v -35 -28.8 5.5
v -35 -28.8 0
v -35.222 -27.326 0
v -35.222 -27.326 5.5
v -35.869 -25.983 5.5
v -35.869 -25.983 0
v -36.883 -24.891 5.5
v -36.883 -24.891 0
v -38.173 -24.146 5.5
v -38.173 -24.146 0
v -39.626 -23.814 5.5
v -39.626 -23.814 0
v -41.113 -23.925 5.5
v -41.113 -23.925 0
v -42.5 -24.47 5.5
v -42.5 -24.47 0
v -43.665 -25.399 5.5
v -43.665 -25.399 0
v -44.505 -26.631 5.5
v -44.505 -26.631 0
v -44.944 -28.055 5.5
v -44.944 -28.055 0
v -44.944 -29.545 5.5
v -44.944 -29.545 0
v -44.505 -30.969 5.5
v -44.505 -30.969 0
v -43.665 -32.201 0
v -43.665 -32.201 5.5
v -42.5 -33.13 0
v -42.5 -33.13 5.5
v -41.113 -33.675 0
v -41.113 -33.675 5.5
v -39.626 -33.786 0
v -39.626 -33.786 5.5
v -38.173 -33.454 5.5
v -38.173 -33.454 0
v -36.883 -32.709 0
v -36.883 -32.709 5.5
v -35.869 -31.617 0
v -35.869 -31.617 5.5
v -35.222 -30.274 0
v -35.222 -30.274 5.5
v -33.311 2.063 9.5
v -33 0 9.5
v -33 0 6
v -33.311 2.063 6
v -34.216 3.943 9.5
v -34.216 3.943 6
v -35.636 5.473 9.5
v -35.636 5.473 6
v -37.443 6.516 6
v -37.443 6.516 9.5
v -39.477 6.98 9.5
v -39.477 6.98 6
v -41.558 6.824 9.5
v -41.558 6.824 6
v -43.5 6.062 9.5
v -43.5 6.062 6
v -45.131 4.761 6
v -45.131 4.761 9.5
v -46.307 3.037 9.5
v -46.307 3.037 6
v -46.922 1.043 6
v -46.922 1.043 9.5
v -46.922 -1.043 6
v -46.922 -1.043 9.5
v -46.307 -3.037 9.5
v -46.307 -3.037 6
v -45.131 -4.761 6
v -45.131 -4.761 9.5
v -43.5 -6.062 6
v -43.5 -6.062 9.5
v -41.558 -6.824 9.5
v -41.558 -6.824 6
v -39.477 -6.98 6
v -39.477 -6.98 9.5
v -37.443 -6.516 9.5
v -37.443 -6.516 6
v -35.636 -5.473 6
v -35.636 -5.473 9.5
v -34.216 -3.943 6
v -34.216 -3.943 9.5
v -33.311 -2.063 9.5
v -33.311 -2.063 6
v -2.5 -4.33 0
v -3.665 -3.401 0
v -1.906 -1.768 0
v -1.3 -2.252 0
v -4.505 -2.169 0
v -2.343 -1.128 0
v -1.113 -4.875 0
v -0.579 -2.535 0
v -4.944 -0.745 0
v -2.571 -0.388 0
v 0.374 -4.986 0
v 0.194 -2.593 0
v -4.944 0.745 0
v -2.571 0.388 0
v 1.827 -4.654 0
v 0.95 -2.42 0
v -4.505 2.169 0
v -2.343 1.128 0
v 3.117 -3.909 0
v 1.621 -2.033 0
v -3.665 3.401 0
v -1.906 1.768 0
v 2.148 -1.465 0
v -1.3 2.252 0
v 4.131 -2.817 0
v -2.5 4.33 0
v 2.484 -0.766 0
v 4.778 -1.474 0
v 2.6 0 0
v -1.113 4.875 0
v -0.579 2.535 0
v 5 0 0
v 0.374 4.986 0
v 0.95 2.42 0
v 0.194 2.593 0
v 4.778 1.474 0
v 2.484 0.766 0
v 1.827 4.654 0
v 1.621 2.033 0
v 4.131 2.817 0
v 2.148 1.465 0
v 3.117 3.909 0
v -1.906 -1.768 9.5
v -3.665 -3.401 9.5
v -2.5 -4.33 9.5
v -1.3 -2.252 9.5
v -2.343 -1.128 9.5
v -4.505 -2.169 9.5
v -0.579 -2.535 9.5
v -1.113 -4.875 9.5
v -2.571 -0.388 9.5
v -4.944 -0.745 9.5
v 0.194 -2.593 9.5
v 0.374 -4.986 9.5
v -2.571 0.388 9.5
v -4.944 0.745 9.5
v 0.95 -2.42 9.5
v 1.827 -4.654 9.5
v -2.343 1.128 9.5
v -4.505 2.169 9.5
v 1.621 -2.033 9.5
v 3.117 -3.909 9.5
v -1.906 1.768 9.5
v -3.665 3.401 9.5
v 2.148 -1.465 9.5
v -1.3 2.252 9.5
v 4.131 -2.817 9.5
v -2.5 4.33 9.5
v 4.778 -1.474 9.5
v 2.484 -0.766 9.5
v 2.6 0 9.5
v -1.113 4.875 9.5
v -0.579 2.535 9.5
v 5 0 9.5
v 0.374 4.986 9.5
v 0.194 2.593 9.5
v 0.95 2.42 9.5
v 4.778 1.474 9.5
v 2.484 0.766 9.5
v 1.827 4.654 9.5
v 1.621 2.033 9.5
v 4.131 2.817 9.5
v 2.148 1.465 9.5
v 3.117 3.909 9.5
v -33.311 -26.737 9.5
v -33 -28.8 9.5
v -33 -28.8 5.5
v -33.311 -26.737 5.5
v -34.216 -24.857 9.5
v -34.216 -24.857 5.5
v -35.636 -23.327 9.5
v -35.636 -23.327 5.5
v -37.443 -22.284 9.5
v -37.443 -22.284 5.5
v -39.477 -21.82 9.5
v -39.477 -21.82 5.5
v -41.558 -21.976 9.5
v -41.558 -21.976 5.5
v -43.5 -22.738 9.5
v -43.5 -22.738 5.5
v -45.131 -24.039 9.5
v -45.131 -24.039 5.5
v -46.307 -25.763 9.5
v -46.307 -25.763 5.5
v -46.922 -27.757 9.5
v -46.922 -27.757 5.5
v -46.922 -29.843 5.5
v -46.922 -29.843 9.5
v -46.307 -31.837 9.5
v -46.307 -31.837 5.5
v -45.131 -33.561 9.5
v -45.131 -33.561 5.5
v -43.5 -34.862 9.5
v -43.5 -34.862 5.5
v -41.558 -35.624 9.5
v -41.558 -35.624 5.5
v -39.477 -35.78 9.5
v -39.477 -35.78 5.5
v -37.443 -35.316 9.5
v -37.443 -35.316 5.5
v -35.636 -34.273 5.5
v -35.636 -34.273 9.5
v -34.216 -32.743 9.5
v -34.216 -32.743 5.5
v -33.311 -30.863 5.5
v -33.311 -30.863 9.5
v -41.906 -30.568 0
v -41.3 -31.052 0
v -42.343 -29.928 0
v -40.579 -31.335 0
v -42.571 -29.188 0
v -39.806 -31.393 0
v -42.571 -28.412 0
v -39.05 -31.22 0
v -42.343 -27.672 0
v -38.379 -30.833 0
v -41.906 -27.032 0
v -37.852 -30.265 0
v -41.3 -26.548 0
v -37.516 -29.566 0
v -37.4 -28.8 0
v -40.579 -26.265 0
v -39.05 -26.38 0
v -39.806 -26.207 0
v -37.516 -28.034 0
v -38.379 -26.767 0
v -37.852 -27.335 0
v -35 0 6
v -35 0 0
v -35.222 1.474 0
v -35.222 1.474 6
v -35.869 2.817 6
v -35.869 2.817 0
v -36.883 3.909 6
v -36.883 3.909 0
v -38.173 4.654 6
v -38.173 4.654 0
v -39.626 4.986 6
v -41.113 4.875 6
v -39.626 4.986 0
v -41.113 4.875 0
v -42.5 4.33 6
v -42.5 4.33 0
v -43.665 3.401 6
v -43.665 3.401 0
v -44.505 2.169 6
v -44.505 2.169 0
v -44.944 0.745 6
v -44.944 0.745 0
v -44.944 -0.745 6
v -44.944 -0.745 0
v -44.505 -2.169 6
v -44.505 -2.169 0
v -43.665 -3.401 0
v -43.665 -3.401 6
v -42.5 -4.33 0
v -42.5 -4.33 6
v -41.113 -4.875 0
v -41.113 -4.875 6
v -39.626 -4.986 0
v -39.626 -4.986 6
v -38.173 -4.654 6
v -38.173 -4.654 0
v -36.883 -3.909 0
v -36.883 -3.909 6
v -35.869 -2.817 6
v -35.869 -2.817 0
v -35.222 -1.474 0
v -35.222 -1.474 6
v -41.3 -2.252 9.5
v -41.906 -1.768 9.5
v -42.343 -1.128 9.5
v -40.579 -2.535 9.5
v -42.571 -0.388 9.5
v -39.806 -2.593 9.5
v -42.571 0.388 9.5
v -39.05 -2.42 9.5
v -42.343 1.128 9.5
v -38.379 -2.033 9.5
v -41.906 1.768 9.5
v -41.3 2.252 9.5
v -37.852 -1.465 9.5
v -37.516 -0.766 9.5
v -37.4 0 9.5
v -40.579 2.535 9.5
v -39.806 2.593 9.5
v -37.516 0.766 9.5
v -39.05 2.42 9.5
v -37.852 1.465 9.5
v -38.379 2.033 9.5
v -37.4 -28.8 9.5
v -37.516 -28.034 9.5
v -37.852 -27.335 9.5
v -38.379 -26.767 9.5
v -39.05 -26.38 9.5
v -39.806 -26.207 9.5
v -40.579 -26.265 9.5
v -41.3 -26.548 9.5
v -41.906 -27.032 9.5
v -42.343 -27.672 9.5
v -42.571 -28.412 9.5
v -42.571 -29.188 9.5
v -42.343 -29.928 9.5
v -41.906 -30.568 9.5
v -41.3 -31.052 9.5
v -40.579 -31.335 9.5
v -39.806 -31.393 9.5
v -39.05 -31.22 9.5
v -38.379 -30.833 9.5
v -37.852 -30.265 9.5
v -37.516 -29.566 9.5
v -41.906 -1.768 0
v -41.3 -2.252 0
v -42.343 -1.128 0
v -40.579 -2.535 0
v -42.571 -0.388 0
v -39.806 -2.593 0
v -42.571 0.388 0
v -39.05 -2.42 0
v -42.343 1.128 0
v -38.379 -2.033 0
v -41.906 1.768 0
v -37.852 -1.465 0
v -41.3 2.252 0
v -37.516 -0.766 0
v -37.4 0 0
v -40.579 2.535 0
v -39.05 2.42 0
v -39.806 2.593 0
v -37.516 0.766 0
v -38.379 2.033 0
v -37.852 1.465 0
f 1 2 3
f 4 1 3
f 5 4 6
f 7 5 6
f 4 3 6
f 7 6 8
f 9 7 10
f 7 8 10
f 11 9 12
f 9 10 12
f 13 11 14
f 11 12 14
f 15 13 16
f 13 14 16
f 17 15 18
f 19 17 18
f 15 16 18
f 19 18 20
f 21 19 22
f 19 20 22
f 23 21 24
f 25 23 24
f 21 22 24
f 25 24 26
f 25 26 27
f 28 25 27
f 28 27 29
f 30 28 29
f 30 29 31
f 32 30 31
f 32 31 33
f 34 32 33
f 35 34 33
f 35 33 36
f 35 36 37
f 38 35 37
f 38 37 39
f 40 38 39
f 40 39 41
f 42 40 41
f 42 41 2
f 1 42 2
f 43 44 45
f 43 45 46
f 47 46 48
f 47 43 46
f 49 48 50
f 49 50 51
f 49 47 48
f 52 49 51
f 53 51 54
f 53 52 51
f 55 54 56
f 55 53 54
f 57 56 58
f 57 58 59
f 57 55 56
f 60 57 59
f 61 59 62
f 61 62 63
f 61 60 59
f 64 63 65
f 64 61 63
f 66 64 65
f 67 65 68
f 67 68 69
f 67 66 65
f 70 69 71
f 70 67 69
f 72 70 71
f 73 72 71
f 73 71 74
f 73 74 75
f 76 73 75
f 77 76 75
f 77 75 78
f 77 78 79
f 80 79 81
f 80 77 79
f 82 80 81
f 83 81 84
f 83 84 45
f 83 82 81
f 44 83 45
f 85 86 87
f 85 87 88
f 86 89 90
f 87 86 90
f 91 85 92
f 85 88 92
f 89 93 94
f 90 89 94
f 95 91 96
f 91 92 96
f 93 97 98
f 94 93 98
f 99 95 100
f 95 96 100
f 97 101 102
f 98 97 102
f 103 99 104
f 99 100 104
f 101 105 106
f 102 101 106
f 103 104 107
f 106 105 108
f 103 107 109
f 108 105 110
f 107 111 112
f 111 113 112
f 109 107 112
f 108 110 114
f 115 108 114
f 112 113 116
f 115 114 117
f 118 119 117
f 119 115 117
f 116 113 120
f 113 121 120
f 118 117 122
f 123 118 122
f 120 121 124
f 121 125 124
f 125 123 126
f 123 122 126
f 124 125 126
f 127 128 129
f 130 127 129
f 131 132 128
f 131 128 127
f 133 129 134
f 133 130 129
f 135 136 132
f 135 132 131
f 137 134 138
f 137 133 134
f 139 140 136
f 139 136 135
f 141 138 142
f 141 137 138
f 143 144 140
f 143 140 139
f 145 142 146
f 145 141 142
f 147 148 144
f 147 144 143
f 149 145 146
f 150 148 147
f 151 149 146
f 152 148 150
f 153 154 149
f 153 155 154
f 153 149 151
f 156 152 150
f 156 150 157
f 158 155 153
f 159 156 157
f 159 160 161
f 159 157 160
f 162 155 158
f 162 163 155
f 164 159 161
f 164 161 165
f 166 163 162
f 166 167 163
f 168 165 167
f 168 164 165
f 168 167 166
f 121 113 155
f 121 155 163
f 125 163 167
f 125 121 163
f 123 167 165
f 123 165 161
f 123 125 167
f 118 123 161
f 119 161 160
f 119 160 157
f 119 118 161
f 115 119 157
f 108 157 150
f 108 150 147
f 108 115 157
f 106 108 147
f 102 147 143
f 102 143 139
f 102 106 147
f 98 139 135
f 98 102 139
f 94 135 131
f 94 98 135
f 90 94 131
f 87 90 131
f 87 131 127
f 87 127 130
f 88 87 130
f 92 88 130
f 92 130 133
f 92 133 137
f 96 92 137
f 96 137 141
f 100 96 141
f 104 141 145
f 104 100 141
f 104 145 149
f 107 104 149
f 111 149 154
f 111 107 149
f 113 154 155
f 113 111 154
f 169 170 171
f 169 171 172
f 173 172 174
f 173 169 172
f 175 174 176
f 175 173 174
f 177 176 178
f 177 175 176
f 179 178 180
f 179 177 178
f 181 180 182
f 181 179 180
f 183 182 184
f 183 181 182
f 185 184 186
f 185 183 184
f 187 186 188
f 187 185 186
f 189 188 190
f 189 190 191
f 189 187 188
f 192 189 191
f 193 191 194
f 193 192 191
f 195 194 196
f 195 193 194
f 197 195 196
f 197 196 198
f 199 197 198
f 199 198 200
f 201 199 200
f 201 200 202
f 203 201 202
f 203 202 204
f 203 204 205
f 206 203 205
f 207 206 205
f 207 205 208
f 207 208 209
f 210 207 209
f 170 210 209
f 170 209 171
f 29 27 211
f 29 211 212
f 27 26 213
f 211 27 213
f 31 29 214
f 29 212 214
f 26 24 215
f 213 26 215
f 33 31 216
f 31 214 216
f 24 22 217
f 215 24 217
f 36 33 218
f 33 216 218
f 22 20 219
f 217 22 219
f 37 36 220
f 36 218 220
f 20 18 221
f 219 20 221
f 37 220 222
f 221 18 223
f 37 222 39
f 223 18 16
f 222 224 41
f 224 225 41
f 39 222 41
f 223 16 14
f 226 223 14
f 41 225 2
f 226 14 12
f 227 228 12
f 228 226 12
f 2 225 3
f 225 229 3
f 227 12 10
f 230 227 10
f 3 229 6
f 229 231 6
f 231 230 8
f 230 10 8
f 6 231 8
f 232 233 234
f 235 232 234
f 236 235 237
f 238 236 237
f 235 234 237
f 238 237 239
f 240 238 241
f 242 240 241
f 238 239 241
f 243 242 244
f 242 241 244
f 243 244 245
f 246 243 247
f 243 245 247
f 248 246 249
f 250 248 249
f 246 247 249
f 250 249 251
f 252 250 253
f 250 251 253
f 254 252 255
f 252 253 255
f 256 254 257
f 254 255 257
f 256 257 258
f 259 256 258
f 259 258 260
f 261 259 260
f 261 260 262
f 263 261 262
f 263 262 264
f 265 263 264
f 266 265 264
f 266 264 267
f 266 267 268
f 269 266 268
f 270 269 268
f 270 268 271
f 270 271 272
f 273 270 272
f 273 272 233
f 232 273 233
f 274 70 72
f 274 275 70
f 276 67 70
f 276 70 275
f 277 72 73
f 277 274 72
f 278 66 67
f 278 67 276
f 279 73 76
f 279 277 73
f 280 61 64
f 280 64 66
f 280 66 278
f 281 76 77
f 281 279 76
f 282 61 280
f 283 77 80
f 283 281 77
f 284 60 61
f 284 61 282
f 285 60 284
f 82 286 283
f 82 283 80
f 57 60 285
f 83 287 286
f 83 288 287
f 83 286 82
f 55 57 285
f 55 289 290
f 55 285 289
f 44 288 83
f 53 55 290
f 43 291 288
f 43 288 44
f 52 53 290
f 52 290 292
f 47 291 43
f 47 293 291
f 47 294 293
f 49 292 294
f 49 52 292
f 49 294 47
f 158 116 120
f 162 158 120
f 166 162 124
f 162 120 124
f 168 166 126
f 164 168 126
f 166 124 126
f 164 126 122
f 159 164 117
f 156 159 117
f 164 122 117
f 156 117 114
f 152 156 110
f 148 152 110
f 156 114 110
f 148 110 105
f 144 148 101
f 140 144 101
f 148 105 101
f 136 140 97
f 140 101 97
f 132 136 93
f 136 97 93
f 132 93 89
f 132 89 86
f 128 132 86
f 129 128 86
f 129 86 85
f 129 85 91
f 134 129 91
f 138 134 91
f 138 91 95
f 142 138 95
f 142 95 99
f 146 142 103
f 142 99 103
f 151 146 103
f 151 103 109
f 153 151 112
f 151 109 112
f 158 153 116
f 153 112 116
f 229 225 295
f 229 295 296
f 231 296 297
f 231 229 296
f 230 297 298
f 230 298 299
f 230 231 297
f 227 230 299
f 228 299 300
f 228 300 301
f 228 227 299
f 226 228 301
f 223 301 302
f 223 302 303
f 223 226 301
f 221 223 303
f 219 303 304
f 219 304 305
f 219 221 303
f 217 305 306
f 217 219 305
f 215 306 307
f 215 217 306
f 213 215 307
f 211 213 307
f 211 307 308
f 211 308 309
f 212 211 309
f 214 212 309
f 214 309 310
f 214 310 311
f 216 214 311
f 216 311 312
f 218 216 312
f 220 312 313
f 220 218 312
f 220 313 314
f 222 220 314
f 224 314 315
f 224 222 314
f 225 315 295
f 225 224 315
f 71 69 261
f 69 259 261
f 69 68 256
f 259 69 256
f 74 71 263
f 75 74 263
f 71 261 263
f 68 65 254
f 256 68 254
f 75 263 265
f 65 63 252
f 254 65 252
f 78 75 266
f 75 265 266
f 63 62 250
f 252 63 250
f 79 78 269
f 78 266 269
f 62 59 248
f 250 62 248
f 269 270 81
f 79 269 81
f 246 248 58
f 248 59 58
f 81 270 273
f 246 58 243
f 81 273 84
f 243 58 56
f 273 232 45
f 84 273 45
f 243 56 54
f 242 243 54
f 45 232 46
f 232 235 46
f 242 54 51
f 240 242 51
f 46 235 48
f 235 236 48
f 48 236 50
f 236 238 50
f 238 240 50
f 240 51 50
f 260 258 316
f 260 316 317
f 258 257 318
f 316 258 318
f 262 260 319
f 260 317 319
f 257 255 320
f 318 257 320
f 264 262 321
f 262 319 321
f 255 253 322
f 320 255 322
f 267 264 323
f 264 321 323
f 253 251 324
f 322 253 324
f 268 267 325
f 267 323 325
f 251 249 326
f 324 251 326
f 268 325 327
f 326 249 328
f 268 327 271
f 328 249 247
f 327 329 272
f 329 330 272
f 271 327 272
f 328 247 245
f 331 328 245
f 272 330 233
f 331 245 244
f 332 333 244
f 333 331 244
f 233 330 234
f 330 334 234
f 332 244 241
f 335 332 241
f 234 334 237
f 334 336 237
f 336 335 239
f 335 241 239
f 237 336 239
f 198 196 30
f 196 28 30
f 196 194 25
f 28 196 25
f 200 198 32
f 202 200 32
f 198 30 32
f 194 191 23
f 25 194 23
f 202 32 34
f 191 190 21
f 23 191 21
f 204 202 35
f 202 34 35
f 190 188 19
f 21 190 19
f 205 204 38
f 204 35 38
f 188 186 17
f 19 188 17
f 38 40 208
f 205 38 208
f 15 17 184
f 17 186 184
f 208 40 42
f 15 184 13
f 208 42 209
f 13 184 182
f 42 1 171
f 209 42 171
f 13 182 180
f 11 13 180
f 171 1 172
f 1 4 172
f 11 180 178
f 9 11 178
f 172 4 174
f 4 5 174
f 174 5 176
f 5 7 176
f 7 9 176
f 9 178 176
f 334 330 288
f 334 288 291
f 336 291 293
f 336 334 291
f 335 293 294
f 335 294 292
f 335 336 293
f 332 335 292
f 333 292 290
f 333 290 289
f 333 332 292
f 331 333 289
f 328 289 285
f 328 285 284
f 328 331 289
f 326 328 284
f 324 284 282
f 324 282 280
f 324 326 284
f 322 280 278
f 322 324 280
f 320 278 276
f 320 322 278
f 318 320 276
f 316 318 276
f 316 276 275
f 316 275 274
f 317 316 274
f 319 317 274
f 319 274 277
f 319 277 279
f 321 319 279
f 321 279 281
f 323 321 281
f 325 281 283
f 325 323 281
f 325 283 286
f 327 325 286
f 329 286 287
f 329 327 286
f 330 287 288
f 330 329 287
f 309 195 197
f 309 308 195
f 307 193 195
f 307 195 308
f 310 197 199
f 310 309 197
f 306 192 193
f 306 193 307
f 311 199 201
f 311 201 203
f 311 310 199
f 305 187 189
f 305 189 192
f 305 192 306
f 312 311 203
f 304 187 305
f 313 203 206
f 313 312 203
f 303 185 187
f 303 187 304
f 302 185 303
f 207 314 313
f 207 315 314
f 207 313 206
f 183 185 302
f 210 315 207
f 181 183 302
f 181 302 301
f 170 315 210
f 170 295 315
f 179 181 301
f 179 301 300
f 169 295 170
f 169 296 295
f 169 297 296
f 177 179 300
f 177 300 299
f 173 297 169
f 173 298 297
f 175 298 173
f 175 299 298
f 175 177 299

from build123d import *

# Parameters (mm, degrees)
F0_R     = 5
F0_R_2   = 2.6
F1_DEPTH = 9.5
F4_R     = 7
F4_R_2   = 5
F5_DEPTH = 3.5
F6_R     = 7
F6_R_2   = 5
F7_DEPTH = 4


with BuildPart() as f1:
    # F0 (on Top) → F1 (new body)
    with BuildSketch(Plane.XY):
        Circle(F0_R)
        Circle(F0_R_2, mode=Mode.SUBTRACT)
    extrude(amount=F1_DEPTH)


with BuildPart() as f2_1:
    # F2: copy of F1
    add(f1.part.moved(Location((-40, 0, 0))))

    # F4 (on face) → F5 (join)
    with BuildSketch(Plane.XY.offset(9.5)):
        with Locations((-40, 0)):
            Circle(F4_R)
        with Locations((-40, 0)):
            Circle(F4_R_2, mode=Mode.SUBTRACT)
    extrude(amount=-F5_DEPTH)


with BuildPart() as f3_1:
    # F3: copy of F2_1
    add(f2_1.part.moved(Location((0, -28.8, 0))))

    # F6 (on face) → F7 (join)
    with BuildSketch(Plane.XY.offset(9.5)):
        with Locations((-40, -28.8)):
            Circle(F6_R)
        with Locations((-40, -28.8)):
            Circle(F6_R_2, mode=Mode.SUBTRACT)
    extrude(amount=-F7_DEPTH)


solid = Compound([f1.part, f2_1.part, f3_1.part])
